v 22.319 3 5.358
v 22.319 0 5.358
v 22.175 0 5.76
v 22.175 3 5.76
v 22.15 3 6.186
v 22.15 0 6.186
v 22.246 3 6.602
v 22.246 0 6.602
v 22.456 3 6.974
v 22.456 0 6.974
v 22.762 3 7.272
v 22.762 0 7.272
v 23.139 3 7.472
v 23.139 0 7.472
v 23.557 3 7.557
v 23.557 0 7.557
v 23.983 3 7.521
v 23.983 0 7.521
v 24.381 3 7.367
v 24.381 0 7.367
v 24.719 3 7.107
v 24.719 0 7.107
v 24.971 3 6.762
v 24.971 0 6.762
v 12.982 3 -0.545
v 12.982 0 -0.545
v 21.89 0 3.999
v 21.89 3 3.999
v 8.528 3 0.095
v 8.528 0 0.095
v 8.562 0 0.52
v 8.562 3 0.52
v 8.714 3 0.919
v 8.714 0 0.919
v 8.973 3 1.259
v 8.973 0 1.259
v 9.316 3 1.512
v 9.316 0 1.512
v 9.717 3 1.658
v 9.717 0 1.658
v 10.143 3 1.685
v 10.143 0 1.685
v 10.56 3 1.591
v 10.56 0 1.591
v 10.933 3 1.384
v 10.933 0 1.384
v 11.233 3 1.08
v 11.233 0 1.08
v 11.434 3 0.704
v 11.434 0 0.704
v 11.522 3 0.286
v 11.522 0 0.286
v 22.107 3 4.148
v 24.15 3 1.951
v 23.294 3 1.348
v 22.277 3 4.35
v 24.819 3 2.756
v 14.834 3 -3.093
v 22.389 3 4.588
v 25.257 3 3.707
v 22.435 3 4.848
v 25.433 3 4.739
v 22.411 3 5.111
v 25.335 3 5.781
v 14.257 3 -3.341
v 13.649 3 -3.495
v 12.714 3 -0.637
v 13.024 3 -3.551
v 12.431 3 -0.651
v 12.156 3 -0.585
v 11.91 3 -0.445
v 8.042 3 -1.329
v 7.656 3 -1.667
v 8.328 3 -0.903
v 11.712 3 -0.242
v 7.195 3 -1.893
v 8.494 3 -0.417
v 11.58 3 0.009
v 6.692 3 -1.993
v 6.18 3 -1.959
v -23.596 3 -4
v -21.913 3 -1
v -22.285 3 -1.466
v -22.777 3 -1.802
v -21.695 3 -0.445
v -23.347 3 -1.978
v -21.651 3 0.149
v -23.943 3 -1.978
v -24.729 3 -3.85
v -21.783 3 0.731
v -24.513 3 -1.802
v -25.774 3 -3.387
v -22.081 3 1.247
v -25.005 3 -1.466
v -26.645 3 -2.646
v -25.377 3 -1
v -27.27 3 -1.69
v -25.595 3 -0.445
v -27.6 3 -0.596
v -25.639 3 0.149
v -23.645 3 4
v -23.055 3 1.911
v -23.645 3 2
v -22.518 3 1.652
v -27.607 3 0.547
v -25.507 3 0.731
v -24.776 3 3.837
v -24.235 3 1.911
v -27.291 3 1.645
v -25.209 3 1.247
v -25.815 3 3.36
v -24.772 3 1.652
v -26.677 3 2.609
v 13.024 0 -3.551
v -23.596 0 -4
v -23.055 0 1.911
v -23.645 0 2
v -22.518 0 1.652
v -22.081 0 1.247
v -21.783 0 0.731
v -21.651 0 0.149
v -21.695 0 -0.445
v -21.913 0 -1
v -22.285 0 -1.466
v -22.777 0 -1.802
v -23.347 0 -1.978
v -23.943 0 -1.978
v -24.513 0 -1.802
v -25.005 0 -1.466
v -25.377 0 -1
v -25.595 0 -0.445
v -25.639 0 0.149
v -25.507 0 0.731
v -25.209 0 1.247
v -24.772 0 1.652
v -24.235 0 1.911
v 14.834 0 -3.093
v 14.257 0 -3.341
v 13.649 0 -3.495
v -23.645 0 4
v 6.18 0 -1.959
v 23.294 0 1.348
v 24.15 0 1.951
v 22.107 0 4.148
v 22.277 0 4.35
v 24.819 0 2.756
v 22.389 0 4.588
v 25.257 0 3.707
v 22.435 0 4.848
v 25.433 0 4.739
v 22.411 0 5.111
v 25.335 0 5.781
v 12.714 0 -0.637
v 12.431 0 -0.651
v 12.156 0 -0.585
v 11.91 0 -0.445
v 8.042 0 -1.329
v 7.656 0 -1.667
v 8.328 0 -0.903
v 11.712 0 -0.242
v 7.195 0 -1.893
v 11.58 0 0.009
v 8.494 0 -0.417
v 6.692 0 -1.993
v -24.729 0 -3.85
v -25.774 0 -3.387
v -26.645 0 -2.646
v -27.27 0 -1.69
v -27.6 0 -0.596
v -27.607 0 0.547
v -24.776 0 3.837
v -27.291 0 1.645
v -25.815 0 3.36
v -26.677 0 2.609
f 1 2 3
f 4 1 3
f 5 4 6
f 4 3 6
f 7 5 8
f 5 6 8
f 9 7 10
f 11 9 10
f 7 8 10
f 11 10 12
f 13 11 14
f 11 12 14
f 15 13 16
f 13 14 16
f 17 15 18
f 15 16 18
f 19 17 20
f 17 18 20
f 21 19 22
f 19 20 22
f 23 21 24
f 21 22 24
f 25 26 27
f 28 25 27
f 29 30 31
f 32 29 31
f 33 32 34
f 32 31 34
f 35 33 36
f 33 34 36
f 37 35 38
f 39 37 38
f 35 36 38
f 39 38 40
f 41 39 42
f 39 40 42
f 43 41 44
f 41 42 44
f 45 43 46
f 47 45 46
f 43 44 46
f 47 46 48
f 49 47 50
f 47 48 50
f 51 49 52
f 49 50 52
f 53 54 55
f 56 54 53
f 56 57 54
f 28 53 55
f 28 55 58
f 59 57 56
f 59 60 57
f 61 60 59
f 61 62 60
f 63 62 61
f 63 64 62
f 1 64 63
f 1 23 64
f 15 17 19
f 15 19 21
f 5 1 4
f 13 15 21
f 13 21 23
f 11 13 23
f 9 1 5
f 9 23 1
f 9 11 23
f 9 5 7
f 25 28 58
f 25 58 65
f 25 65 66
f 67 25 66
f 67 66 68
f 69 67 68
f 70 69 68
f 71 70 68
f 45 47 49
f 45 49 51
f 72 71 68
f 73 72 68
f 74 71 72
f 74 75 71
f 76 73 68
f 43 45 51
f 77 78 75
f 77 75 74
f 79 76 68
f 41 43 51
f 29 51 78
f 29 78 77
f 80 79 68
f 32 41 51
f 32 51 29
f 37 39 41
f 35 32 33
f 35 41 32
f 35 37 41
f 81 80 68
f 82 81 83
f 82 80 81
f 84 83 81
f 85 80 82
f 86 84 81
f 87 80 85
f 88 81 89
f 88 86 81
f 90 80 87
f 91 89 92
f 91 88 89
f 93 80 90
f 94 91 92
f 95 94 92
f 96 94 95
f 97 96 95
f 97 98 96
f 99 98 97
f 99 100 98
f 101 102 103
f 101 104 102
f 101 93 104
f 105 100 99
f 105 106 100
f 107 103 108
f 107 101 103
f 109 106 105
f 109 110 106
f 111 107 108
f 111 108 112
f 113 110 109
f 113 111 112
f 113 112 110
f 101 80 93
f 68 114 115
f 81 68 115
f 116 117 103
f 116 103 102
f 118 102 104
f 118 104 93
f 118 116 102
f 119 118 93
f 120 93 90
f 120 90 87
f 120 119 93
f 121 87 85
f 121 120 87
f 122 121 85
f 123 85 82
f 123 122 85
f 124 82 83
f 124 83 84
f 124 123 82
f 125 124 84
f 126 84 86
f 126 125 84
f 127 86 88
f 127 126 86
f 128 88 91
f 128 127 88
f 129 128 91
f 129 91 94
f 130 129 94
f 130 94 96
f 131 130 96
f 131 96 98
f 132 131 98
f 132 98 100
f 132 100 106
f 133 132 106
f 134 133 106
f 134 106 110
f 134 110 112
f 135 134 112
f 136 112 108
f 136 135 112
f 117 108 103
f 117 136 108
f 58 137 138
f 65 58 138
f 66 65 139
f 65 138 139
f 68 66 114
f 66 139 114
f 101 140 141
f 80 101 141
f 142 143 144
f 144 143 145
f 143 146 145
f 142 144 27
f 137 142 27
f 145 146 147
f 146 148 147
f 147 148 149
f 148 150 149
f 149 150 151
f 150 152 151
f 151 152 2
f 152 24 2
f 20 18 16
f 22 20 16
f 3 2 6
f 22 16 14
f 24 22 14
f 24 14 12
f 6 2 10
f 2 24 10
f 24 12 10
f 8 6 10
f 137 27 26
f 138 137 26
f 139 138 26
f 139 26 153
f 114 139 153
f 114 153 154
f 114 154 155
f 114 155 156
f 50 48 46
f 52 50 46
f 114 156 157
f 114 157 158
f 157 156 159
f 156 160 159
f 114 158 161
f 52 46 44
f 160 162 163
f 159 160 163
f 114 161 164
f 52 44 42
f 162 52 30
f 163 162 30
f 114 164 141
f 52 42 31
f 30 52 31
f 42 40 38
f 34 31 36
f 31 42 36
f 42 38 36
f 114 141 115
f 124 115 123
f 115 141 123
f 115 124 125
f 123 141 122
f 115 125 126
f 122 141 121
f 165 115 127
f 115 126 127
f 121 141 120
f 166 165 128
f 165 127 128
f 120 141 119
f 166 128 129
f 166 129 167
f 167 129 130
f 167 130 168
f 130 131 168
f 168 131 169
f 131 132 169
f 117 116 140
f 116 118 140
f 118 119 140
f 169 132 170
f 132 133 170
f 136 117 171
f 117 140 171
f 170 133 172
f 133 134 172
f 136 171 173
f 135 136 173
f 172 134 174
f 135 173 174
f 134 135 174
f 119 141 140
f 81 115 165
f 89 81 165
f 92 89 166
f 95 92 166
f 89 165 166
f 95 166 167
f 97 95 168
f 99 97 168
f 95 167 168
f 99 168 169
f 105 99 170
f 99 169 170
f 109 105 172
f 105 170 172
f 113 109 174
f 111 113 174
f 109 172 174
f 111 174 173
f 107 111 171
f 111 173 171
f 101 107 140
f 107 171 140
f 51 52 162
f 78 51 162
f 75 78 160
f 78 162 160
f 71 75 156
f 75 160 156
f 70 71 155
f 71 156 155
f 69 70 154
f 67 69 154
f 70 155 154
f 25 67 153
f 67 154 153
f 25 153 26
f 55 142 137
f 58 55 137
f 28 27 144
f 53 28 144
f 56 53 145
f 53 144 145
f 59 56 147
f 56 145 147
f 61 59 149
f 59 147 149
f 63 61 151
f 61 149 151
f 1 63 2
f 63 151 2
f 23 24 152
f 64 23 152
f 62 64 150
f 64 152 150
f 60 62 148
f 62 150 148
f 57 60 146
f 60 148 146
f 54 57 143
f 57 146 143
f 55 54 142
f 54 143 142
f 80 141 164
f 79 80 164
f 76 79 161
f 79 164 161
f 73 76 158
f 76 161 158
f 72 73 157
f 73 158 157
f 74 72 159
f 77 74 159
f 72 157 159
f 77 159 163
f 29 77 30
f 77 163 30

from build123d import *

# Parameters (mm, degrees)
SKETCH1_R           = 2
BOSS_EXTRUDE1_DEPTH = 3


with BuildPart() as part:
    # Sketch1 → Boss-Extrude1 (new body)
    with BuildSketch(Plane(origin=(0, 0, 0), x_dir=(-1, 0, 0), z_dir=(0, 1, 0))):
        with BuildLine():
            Line((-13.023955953, -3.551475079), (23.596044053, -3.999700403))
            ThreePointArc((23.596044053, -3.999700403), (27.6449251, -0.024478432), (23.645, 4))
            Line((23.645, 4), (-6.179618863, -1.958864922))
            ThreePointArc((-6.179618863, -1.958864922), (-7.859851478, -1.510674898), (-8.52802301, 0.094816535))
            ThreePointArc((-8.52802301, 0.094816535), (-9.929506285, 1.686957231), (-11.521937407, 0.285803961))
            ThreePointArc((-11.521937407, 0.285803961), (-12.027681304, -0.523458534), (-12.981727074, -0.545352487))
            Line((-12.981727074, -0.545352487), (-21.889675517, 3.998669315))
            ThreePointArc((-21.889675517, 3.998669315), (-22.389088805, 4.58847924), (-22.319318125, 5.358168419))
            ThreePointArc((-22.319318125, 5.358168419), (-22.943168419, 7.385681875), (-24.970681875, 6.761831581))
            ThreePointArc((-24.970681875, 6.761831581), (-25.256630844, 3.706810464), (-23.29448222, 1.347807789))
            Line((-23.29448222, 1.347807789), (-14.834203373, -3.093435701))
            ThreePointArc((-14.834203373, -3.093435701), (-13.956181951, -3.429568117), (-13.023955953, -3.551475079))
        make_face()
        with Locations(Location((23.645, 0, 0), (0, 0, 90))):
            Circle(SKETCH1_R, mode=Mode.SUBTRACT)
    extrude(amount=BOSS_EXTRUDE1_DEPTH)


solid = part.part
